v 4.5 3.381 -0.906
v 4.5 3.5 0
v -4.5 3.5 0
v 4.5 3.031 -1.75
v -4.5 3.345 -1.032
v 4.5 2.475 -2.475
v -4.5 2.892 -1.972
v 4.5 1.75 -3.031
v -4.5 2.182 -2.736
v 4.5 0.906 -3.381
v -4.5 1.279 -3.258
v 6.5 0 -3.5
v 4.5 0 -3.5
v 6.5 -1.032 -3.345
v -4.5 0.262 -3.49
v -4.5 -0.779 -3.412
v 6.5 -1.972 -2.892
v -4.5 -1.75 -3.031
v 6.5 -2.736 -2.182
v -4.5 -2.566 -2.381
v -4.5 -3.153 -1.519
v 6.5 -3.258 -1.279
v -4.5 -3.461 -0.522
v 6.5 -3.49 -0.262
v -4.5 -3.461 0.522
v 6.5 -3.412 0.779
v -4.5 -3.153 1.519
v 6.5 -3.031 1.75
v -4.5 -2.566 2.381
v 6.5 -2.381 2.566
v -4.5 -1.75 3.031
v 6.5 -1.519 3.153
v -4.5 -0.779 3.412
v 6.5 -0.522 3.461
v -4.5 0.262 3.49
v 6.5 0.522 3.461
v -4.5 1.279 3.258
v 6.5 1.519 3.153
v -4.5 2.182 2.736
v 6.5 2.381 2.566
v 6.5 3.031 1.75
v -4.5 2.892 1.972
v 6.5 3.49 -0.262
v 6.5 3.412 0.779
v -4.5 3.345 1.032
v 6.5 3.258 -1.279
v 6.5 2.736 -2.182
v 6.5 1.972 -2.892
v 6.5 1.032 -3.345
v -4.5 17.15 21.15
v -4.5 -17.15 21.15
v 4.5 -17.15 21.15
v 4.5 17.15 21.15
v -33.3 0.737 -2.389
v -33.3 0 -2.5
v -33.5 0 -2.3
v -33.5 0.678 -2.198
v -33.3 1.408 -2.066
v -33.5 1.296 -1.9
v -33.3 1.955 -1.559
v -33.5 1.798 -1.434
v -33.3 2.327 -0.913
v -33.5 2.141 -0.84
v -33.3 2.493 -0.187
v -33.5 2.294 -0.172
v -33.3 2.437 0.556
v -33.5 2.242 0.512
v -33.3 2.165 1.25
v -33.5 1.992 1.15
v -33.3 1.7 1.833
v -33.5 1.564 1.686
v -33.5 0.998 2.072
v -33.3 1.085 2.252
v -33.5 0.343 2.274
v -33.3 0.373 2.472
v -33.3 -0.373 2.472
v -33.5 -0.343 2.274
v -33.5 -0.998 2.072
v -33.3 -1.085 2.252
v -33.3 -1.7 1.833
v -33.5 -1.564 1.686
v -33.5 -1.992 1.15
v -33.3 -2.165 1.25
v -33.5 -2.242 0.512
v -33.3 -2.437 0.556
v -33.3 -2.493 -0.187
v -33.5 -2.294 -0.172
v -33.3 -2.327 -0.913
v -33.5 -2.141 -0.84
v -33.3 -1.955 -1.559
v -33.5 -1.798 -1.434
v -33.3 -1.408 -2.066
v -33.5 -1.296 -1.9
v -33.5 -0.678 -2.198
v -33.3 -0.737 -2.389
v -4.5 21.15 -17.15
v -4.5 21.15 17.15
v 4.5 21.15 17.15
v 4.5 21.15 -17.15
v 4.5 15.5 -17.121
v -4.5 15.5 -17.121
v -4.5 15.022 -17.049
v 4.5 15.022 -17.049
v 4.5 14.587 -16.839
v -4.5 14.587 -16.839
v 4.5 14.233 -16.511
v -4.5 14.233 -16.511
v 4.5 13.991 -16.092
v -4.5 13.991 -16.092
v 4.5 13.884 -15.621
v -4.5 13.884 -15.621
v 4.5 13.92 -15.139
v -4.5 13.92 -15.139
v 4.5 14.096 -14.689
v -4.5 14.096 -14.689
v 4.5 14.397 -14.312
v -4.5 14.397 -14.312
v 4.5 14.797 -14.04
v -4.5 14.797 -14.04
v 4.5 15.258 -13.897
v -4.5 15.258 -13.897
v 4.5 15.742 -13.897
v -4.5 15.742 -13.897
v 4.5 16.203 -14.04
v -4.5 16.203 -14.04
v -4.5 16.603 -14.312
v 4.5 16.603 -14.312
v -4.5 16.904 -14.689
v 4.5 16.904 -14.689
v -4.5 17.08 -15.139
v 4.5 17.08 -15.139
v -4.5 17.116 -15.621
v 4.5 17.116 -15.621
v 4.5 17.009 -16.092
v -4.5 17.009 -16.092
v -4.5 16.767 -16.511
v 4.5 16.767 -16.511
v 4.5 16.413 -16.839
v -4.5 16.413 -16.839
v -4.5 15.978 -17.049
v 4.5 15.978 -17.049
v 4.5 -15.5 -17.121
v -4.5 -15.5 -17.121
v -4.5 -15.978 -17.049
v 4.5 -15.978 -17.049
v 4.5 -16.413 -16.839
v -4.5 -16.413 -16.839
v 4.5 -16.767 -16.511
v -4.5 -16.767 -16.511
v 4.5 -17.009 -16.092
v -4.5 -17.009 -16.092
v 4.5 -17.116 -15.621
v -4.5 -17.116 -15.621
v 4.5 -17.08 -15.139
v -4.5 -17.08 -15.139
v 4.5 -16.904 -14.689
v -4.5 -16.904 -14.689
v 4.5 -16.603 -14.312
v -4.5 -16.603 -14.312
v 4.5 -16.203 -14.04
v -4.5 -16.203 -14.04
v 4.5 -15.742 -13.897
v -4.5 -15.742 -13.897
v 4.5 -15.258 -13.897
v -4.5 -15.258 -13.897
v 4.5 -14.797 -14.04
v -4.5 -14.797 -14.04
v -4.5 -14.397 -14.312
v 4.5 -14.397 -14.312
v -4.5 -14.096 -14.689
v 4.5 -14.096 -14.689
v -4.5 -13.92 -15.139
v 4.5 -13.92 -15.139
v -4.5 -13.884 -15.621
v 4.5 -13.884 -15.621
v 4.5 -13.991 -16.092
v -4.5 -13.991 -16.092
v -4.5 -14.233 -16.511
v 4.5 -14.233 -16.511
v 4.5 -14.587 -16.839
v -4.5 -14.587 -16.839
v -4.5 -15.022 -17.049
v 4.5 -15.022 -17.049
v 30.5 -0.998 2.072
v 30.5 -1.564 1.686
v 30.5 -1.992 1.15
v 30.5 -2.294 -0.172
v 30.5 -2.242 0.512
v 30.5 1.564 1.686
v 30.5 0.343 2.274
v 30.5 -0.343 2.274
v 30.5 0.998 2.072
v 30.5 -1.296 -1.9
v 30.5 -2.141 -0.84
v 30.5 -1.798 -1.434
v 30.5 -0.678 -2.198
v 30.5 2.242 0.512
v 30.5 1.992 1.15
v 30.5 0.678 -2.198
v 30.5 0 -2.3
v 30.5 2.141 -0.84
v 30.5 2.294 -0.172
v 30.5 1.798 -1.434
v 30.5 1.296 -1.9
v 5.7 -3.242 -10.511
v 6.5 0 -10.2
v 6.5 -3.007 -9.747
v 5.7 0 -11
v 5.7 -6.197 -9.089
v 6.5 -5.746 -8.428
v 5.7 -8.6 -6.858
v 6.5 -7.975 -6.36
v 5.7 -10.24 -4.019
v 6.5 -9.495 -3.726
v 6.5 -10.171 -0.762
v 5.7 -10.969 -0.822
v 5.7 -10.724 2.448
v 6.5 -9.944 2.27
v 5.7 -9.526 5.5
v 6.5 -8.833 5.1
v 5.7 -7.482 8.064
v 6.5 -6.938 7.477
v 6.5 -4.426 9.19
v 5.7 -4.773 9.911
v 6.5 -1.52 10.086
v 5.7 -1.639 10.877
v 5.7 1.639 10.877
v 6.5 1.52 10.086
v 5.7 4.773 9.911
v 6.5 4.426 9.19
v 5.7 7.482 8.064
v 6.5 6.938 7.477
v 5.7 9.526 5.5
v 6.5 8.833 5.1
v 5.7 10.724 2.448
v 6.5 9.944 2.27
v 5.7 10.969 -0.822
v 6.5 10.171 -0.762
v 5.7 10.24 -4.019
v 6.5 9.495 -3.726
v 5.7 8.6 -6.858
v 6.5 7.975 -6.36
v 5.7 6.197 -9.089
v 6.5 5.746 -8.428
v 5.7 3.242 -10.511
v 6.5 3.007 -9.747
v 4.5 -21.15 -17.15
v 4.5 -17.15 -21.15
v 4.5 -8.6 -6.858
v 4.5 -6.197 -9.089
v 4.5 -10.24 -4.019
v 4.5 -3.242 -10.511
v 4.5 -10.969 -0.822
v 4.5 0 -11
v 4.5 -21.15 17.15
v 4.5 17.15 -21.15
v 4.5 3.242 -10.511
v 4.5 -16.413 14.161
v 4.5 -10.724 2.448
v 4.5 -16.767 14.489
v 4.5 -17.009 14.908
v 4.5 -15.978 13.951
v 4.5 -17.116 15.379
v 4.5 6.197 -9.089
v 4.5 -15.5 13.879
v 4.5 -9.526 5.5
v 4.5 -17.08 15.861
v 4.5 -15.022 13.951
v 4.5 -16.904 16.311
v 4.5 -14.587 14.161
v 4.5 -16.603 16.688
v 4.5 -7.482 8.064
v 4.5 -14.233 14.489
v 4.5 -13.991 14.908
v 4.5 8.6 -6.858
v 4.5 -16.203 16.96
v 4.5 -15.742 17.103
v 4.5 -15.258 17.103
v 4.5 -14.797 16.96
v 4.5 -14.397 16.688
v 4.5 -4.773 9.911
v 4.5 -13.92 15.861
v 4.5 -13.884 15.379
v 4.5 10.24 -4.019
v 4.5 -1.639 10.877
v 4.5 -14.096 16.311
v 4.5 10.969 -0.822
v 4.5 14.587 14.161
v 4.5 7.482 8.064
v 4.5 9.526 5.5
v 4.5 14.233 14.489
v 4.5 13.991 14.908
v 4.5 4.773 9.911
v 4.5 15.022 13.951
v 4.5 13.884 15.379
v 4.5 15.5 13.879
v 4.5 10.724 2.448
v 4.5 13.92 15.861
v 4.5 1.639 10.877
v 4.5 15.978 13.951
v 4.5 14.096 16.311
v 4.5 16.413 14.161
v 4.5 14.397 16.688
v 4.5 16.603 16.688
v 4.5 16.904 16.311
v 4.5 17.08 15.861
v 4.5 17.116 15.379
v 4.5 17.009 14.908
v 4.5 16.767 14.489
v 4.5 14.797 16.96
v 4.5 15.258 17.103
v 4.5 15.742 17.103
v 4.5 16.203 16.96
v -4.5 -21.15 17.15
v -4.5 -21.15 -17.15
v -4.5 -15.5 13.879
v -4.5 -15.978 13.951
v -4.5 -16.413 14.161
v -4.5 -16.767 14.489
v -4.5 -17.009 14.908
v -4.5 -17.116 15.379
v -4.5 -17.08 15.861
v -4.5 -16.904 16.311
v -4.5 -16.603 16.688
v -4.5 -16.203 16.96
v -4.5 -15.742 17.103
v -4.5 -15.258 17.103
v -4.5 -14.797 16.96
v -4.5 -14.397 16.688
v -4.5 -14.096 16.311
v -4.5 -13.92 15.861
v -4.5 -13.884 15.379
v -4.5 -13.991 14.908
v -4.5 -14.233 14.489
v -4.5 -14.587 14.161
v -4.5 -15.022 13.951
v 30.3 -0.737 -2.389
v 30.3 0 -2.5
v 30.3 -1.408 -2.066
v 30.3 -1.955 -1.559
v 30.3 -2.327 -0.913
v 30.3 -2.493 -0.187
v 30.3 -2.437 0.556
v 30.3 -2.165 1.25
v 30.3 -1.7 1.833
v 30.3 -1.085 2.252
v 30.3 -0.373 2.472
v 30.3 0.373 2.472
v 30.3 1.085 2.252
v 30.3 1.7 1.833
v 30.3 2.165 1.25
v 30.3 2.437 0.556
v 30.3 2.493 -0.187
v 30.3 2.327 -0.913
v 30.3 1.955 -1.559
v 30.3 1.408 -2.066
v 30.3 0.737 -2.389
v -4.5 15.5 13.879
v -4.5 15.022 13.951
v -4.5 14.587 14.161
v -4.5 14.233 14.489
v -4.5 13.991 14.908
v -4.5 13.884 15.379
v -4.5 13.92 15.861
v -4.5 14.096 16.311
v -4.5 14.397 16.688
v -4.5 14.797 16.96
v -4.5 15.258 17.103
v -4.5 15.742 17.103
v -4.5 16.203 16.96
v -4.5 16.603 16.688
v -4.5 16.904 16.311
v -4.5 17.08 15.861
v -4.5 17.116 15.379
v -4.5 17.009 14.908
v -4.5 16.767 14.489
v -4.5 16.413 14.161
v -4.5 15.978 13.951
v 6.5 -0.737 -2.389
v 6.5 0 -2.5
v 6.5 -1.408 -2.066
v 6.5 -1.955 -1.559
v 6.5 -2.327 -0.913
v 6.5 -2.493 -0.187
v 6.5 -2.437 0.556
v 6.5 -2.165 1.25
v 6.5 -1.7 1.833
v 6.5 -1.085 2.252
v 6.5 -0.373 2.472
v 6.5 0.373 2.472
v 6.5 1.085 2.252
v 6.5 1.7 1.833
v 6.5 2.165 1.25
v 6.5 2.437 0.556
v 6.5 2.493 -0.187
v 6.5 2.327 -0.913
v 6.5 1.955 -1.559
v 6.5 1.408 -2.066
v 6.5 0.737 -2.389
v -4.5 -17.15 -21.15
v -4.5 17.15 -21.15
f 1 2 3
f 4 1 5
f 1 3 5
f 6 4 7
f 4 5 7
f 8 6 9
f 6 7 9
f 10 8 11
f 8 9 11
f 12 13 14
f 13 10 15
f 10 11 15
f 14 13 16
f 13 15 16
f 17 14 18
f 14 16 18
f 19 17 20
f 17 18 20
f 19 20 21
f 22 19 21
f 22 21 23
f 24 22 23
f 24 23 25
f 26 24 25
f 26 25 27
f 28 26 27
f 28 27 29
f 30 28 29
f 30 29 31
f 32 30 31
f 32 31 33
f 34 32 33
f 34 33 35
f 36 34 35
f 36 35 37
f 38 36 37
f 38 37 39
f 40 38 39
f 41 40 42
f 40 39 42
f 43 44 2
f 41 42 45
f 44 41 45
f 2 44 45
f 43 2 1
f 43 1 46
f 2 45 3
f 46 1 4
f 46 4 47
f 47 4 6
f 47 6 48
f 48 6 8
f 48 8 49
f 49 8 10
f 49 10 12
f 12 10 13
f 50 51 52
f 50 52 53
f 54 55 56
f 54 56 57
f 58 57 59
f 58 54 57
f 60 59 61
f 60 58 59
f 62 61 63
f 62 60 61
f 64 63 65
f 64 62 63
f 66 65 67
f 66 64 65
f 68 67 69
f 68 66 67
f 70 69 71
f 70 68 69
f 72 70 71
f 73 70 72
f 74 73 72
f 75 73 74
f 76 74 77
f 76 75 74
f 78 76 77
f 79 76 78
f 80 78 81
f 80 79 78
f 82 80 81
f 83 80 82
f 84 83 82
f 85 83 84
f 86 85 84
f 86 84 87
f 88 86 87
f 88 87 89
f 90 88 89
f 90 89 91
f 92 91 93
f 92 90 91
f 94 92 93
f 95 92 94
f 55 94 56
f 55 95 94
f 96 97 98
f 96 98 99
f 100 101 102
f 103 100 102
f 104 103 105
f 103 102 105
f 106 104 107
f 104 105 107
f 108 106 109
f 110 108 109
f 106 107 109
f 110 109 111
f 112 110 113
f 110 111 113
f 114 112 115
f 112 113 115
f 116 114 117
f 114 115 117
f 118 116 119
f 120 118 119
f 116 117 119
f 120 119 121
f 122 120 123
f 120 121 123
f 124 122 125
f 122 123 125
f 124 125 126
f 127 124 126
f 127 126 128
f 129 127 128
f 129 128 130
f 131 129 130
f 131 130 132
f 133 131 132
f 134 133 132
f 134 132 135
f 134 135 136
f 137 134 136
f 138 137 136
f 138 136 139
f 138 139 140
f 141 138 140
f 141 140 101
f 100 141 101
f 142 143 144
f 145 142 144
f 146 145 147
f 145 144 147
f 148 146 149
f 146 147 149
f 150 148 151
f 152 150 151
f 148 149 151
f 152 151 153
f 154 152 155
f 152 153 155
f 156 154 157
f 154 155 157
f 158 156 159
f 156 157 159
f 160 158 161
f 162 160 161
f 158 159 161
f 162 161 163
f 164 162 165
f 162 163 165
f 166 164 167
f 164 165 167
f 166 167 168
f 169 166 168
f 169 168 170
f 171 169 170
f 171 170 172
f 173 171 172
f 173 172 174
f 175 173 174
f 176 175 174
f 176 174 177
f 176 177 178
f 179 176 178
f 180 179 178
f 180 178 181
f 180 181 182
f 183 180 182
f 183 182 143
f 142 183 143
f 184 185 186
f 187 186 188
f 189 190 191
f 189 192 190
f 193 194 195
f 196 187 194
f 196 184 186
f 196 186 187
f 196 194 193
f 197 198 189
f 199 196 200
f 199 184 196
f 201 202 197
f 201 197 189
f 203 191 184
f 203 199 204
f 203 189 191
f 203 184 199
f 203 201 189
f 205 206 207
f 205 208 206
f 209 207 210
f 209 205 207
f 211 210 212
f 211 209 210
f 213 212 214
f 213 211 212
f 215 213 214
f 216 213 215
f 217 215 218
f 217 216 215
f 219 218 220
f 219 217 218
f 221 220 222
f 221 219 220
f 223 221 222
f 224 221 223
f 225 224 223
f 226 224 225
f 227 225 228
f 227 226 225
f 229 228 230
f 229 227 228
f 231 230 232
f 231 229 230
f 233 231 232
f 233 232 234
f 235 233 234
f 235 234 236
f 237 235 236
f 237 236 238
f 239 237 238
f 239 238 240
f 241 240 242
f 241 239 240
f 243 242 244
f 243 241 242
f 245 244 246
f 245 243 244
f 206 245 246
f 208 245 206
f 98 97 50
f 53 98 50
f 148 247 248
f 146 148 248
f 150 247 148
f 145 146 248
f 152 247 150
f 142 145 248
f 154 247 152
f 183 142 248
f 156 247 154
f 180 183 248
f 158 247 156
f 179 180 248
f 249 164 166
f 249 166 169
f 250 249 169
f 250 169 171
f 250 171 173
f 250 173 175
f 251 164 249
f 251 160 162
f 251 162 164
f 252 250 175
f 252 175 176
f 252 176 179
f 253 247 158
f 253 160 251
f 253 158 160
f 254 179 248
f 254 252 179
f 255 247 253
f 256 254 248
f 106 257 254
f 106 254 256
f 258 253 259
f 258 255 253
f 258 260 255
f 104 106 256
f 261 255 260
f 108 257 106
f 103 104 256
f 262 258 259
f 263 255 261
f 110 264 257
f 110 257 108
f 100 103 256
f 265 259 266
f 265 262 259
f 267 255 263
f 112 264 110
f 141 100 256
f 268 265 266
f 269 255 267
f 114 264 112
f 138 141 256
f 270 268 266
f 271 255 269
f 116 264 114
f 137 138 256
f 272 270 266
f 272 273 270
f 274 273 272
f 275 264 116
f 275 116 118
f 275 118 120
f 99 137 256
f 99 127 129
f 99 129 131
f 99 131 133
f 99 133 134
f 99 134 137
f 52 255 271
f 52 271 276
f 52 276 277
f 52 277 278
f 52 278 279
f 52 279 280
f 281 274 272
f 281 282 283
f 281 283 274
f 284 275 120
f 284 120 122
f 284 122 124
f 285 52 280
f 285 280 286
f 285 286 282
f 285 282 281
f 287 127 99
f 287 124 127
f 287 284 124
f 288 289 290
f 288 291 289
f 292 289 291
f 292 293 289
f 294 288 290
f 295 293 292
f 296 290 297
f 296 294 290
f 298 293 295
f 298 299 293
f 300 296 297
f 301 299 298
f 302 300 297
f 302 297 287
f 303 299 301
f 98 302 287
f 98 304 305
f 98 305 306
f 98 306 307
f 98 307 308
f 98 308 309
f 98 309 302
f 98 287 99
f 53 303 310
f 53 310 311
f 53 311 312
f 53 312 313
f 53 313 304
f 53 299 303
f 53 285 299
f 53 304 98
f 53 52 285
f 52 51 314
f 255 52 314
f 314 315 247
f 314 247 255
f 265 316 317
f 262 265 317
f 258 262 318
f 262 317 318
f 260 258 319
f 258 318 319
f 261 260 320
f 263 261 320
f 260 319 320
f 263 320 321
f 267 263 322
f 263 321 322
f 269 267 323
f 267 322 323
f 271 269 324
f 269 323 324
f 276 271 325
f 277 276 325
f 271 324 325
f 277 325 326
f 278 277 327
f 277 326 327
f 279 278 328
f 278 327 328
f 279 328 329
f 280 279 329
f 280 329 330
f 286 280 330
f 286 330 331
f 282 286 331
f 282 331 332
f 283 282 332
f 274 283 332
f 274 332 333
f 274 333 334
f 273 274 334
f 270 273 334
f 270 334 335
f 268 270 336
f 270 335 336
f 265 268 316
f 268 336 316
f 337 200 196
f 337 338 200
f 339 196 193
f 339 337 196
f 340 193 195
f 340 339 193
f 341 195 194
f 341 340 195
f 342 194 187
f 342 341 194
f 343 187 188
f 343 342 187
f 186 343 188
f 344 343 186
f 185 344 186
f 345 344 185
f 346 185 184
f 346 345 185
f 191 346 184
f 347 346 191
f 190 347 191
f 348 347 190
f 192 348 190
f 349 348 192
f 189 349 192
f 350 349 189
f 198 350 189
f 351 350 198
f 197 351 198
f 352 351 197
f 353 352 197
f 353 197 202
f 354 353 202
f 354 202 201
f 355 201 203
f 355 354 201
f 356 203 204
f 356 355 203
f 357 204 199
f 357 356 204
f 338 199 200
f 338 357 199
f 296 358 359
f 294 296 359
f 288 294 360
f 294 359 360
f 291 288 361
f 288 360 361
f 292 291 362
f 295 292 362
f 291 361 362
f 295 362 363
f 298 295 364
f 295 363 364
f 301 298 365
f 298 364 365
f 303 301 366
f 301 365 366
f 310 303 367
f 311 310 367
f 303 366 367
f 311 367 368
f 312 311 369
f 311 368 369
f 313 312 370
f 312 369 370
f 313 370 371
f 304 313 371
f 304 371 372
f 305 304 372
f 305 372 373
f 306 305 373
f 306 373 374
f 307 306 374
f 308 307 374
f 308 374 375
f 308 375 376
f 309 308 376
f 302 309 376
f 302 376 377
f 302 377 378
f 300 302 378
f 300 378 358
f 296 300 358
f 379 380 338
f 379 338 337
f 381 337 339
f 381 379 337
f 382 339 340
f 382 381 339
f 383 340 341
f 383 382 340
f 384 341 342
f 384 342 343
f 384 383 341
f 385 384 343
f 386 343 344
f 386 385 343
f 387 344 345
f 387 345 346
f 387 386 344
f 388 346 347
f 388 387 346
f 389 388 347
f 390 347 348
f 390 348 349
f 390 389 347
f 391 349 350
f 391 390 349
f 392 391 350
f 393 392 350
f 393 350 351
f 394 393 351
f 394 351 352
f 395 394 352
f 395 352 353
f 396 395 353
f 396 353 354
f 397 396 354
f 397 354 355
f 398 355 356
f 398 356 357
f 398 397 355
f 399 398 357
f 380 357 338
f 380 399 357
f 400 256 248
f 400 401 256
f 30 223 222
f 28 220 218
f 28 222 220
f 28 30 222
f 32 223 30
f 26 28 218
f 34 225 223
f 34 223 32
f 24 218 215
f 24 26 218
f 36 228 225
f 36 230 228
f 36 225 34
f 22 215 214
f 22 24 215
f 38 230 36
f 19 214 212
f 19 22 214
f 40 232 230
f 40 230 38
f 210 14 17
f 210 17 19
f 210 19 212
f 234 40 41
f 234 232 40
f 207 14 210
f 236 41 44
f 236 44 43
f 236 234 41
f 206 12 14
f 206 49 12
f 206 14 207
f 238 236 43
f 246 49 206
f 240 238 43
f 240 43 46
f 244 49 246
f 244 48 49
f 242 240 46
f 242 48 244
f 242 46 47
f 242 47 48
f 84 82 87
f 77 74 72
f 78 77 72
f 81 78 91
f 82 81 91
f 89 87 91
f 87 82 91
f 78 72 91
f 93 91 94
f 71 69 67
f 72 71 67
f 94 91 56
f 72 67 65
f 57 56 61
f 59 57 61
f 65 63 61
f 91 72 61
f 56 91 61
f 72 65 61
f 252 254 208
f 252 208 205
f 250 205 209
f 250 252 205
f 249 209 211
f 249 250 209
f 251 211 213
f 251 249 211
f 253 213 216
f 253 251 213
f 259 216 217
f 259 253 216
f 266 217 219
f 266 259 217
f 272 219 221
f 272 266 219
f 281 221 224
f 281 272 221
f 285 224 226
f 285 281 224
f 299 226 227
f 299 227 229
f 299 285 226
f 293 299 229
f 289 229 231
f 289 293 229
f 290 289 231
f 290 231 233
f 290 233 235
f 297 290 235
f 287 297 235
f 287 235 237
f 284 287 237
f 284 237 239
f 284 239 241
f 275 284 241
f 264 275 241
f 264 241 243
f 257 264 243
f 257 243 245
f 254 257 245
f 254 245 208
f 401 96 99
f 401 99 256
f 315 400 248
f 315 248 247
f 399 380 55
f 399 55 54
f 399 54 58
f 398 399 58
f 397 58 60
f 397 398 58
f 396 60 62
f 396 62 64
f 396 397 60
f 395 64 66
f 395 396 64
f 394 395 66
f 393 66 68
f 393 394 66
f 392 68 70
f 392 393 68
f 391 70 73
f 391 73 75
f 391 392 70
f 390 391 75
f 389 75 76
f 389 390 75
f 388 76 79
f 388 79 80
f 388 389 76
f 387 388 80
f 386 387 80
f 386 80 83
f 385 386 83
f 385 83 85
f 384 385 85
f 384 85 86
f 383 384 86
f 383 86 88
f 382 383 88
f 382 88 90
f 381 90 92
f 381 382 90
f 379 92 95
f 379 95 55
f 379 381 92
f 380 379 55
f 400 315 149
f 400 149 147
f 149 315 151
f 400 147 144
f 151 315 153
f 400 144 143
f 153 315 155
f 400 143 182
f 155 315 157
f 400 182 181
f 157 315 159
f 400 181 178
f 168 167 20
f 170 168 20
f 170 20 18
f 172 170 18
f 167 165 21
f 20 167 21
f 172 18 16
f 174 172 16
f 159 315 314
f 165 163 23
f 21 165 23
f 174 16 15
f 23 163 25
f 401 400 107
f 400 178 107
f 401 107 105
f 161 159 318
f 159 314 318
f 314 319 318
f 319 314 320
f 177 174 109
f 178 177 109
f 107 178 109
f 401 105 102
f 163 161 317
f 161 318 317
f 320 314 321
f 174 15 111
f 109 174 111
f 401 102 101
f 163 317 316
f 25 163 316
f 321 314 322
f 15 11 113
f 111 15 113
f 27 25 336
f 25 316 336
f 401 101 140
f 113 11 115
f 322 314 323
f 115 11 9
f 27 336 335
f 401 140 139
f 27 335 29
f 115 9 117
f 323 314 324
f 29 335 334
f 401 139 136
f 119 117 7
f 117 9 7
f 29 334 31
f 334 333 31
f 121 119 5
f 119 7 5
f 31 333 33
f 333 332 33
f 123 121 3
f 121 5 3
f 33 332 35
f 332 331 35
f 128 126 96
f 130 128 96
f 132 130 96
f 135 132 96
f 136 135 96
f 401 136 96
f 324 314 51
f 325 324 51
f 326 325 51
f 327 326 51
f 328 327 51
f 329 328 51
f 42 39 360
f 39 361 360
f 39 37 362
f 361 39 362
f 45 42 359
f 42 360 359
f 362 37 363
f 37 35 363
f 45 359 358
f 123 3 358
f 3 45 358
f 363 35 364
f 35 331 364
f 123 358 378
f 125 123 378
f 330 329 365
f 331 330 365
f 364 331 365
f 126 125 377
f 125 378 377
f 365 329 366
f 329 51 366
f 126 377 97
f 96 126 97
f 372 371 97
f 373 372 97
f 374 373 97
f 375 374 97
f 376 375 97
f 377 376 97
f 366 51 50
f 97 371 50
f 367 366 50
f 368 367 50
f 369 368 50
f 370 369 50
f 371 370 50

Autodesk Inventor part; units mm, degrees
ref_plane "YZ Plane" through (0, 0, 0) normal (1, 0, 0) x (0, 1, 0)
ref_plane "XZ Plane" through (0, 0, 0) normal (0, 1, 0) x (-1, 0, 0)
ref_plane "XY Plane" through (0, 0, 0) normal (0, 0, 1) x (1, 0, 0)
sketch "Skizze1" plane through (0, 0, 0) normal (1, 0, 0) x (0, 1, 0)
  line L0 (-29.61, 0) -> (29.61, 0) projected
  line L1 (0, -29.61) -> (0, 29.61) projected
  line L2 (-17.15, 21.15) -> (17.15, 21.15)
  line L3 (21.15, 17.15) -> (21.15, -17.15)
  line L4 (17.15, -21.15) -> (-17.15, -21.15)
  line L5 (-21.15, -17.15) -> (-21.15, 17.15)
  line L6 (21.15, 17.15) -> (17.15, 21.15)
  line L7 (21.15, -17.15) -> (17.15, -21.15)
  line L8 (-17.15, -21.15) -> (-21.15, -17.15)
  line L9 (-17.15, 21.15) -> (-21.15, 17.15)
  circle A0 centre (0, 0) radius 3.5
  point P0 (-21.15, 21.15)
  point P1 (21.15, -21.15)
  point P2 (21.15, 21.15)
  point P3 (-21.15, -21.15)
  dimension "d0" = 42.3
  dimension "d1" = 42.3
  dimension "d5" = 4
  dimension "d6" = 4
  dimension "d7" = 4
  dimension "d8" = 4
  dimension "d9" = 4
  dimension "d10" = 4
  dimension "d11" = 4
  dimension "d12" = 4
  dimension "d13" = 7
extrude "Extrusion2" add sketch "Skizze1" along normal mid plane 9 contours L5 L9 L2 L1 A0 L0 | L0 A0 L1 L4 L8 L5 | L1 L2 L6 L3 L0 A0 | A0 L0 L3 L7 L4 L1
sketch "Skizze2" plane through (4.5, 0, 0) normal (1, 0, 0) x (0, 0, -1)
  circle A0 centre (0, 0) radius 3.5 projected
  line L0 (-17.15, 21.15) -> (-21.15, 17.15) projected
  line L1 (-21.15, 17.15) -> (-21.15, -17.15) projected
  line L2 (-21.15, -17.15) -> (-17.15, -21.15) projected
  line L3 (-17.15, -21.15) -> (17.15, -21.15) projected
  line L4 (17.15, -21.15) -> (21.15, -17.15) projected
  line L5 (21.15, -17.15) -> (21.15, 17.15) projected
  line L6 (21.15, 17.15) -> (17.15, 21.15) projected
  line L7 (17.15, 21.15) -> (-17.15, 21.15) projected
  line L8 (0, -29.61) -> (0, 29.61) projected
  line L9 (29.61, 0) -> (-29.61, 0) projected
  point P0 (-15.5, 15.5)
  point P1 (15.5, 15.5)
  point P2 (-15.5, -15.5)
  point P3 (15.5, -15.5)
  dimension "d18" = 15.5
  dimension "d19" = 15.5
hole "Bohrung1" at (4.5, 15.5, 15.5) at (4.5, 15.5, -15.5) at (4.5, -15.5, 15.5) at (4.5, -15.5, -15.5) direction (-1, 0, 0) diameter 3.242 end through all thread size "M4x0.7" class "6H" standard "ISO Metric profile"
sketch "Skizze3" plane through (4.5, 0, 0) normal (1, 0, 0) x (0, 0, -1)
  line L0 (0, -29.61) -> (0, 29.61) projected
  line L1 (29.61, 0) -> (-29.61, 0) projected
  circle A0 centre (0, 0) radius 11
  circle A1 centre (0, 0) radius 3.5
  dimension "d27" = 22
  dimension "d28" = 7
extrude "Extrusion3" add sketch "Skizze3" along normal blind 2 contours A0 L1 A1 L0 | L0 A1 L1 A0 | A0 L0 A1 L1 | L1 A1 L0 A0
chamfer "Fase1" distance 0.8 angle 45 1 edges at (6.5, 0, 11)
sketch "Skizze4" plane through (6.5, 0, 0) normal (1, 0, 0) x (0, 0, -1)
  line L0 (29.61, 0) -> (-29.61, 0) projected
  line L1 (0, -29.61) -> (0, 29.61) projected
  circle A0 centre (0, 0) radius 2.5
  dimension "d34" = 5
extrude "Extrusion4" add sketch "Skizze4" along normal blind 24 and the other way blind 40
chamfer "Fase2" distance 0.2 angle 45 1 edges at (30.5, 0, 2.5)
chamfer "Fase3" distance 0.2 angle 45 1 edges at (-33.5, 0, 2.5)
equation "\"d6\" = d5"
equation "\"d8\" = d7"
equation "\"d9\" = d7"
equation "\"d10\" = d9"
equation "\"d11\" = d7"
equation "\"d12\" = d11"
properties part number "Frontplatte" material "Stahl, Kohlenstoff"
